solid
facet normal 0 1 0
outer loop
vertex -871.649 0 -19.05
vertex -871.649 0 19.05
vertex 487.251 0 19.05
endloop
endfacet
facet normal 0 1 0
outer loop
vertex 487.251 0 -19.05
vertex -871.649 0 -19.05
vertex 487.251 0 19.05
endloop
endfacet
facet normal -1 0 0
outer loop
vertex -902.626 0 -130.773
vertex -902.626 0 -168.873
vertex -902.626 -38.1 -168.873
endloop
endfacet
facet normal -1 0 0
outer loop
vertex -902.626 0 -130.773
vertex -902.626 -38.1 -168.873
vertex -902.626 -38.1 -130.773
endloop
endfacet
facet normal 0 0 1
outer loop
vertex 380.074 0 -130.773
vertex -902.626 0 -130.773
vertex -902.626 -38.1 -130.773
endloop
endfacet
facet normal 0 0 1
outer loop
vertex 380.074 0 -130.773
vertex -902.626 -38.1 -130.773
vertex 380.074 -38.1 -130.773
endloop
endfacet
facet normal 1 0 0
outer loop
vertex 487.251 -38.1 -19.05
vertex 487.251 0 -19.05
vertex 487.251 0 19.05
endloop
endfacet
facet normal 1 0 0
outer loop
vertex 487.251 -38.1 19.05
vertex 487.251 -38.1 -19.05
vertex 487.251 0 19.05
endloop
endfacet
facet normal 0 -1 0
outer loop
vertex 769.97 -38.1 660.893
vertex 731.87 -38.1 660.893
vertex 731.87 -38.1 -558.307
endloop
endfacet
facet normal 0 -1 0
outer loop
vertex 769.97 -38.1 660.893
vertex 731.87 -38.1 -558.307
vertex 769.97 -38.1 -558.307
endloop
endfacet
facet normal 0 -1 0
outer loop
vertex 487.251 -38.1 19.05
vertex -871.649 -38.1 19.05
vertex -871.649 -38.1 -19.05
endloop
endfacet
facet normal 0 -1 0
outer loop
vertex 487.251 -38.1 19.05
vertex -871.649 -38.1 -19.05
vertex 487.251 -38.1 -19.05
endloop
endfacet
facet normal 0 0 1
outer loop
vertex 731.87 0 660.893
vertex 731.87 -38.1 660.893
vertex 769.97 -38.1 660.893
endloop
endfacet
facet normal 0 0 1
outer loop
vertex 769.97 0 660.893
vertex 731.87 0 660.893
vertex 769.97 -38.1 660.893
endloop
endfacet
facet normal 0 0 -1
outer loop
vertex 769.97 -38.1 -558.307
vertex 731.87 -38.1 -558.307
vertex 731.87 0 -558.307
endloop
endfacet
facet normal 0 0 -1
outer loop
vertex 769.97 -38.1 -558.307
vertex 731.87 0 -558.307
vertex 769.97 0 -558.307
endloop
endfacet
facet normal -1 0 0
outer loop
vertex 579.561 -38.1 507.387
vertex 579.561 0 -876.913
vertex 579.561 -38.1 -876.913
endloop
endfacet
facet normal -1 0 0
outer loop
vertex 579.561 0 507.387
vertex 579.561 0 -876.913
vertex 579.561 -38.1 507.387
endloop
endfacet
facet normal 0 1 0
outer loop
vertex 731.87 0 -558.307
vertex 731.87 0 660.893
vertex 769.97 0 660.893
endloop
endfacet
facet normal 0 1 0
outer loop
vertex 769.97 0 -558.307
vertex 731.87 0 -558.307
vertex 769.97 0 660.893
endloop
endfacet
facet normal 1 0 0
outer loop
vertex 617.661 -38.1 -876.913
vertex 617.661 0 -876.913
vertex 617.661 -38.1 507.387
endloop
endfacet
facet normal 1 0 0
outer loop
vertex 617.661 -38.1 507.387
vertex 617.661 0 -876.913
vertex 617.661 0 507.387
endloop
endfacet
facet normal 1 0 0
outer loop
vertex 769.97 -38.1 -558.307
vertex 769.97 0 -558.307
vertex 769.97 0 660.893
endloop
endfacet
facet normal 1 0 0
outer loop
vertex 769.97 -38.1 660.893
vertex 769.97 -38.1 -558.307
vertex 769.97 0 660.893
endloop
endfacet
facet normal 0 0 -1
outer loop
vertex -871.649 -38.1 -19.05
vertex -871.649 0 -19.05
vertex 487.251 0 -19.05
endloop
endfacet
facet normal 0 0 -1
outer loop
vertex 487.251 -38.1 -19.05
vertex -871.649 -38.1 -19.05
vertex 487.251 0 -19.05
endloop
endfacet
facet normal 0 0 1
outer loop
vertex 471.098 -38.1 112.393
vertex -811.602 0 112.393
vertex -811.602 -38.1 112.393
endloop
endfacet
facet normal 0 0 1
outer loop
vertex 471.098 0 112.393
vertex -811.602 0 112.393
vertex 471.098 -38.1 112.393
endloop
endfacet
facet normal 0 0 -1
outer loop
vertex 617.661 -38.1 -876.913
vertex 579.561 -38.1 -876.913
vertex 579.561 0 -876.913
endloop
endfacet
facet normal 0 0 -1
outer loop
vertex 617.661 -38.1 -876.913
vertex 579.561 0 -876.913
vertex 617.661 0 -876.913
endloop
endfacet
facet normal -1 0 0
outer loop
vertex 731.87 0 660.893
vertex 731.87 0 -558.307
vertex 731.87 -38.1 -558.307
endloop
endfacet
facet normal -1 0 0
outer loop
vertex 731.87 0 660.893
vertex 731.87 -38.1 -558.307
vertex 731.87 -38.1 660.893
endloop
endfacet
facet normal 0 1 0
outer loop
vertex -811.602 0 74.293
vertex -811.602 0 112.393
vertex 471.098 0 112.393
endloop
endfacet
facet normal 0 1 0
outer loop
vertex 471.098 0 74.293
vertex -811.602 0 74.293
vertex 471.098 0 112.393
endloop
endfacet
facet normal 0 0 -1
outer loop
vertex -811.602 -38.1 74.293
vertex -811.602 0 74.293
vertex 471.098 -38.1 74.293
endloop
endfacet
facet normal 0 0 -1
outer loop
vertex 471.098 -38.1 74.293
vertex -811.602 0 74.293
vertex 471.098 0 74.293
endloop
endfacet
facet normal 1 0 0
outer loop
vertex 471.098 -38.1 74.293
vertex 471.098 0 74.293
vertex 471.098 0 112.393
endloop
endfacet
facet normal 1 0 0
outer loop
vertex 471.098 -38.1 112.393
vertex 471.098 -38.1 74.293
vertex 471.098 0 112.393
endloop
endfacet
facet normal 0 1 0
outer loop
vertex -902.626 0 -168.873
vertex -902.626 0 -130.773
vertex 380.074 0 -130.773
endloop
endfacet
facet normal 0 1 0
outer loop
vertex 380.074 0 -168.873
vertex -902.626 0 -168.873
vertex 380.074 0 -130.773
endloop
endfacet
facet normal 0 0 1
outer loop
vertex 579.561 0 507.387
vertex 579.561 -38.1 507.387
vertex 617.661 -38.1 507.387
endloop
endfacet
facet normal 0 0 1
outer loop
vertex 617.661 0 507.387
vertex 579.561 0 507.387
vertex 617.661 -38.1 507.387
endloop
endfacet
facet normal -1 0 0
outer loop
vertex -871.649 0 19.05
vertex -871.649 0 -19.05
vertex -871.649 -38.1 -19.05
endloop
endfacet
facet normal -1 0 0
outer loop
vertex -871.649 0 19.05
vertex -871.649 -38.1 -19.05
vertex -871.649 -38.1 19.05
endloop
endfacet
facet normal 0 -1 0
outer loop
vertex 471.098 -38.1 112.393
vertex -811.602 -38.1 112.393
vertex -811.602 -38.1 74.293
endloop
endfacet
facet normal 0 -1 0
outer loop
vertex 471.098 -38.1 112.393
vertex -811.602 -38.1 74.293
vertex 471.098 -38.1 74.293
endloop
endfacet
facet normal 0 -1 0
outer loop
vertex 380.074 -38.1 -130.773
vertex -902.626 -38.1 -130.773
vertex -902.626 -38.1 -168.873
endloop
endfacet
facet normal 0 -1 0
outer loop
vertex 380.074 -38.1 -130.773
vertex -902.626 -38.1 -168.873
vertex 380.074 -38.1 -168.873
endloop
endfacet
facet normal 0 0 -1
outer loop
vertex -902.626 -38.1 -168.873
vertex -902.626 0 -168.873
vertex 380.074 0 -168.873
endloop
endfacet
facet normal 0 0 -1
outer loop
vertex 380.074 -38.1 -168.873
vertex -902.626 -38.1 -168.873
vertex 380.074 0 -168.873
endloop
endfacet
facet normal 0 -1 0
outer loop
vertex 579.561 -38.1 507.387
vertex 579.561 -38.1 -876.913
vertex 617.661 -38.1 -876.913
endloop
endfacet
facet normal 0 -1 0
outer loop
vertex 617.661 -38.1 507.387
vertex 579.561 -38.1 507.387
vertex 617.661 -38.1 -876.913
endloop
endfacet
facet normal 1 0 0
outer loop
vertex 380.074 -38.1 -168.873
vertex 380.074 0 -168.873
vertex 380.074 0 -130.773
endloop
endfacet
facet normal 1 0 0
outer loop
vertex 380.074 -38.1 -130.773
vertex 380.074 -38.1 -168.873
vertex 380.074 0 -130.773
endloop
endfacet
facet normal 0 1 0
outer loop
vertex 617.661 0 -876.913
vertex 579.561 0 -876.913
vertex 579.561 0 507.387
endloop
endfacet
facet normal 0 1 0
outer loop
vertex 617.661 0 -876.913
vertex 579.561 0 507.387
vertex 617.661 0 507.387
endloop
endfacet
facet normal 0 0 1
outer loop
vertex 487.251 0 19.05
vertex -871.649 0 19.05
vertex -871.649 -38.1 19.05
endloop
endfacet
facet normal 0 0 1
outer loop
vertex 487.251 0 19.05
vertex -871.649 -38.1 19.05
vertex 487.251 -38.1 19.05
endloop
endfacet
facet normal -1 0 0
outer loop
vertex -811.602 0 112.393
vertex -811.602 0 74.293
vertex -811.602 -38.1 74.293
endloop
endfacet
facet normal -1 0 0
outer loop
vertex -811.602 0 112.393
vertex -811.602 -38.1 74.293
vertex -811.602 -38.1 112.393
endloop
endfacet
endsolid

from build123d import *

# Parameters (mm, degrees)
F0_W     = 1282.7
F0_H     = 38.1
F3_DEPTH = 38.1
F1_W     = 1358.9
F1_H     = 38.1
F4_DEPTH = 38.1
F2_W     = 38.1
F2_H     = 1384.3
F5_DEPTH = 38.1
F6_W     = 1282.7
F6_H     = 38.1
F8_DEPTH = 38.1
F7_W     = 38.1
F7_H     = 1219.2
F9_DEPTH = 38.1


with BuildPart() as f3:
    # F0 (on Front) → F3 (new body)
    with BuildSketch(Plane.XZ):
        with Locations((-170.252413, 93.3431)):
            Rectangle(F0_W, F0_H)
    extrude(amount=F3_DEPTH)


with BuildPart() as f4:
    # F1 (on Front) → F4 (new body)
    with BuildSketch(Plane.XZ):
        with Locations((-192.198903, 0)):
            Rectangle(F1_W, F1_H)
    extrude(amount=F4_DEPTH)


with BuildPart() as f5:
    # F2 (on Front) → F5 (new body)
    with BuildSketch(Plane.XZ):
        with Locations((598.610921, -184.76284)):
            Rectangle(F2_W, F2_H)
    extrude(amount=F5_DEPTH)


with BuildPart() as f8:
    # F6 (on Front) → F8 (new body)
    with BuildSketch(Plane.XZ):
        with Locations((-261.276394, -149.82342)):
            Rectangle(F6_W, F6_H)
    extrude(amount=F8_DEPTH)


with BuildPart() as f9:
    # F7 (on Front) → F9 (new body)
    with BuildSketch(Plane.XZ):
        with Locations((750.920475, 51.292985)):
            Rectangle(F7_W, F7_H)
    extrude(amount=F9_DEPTH)


solid = Compound([f3.part, f4.part, f5.part, f8.part, f9.part])
